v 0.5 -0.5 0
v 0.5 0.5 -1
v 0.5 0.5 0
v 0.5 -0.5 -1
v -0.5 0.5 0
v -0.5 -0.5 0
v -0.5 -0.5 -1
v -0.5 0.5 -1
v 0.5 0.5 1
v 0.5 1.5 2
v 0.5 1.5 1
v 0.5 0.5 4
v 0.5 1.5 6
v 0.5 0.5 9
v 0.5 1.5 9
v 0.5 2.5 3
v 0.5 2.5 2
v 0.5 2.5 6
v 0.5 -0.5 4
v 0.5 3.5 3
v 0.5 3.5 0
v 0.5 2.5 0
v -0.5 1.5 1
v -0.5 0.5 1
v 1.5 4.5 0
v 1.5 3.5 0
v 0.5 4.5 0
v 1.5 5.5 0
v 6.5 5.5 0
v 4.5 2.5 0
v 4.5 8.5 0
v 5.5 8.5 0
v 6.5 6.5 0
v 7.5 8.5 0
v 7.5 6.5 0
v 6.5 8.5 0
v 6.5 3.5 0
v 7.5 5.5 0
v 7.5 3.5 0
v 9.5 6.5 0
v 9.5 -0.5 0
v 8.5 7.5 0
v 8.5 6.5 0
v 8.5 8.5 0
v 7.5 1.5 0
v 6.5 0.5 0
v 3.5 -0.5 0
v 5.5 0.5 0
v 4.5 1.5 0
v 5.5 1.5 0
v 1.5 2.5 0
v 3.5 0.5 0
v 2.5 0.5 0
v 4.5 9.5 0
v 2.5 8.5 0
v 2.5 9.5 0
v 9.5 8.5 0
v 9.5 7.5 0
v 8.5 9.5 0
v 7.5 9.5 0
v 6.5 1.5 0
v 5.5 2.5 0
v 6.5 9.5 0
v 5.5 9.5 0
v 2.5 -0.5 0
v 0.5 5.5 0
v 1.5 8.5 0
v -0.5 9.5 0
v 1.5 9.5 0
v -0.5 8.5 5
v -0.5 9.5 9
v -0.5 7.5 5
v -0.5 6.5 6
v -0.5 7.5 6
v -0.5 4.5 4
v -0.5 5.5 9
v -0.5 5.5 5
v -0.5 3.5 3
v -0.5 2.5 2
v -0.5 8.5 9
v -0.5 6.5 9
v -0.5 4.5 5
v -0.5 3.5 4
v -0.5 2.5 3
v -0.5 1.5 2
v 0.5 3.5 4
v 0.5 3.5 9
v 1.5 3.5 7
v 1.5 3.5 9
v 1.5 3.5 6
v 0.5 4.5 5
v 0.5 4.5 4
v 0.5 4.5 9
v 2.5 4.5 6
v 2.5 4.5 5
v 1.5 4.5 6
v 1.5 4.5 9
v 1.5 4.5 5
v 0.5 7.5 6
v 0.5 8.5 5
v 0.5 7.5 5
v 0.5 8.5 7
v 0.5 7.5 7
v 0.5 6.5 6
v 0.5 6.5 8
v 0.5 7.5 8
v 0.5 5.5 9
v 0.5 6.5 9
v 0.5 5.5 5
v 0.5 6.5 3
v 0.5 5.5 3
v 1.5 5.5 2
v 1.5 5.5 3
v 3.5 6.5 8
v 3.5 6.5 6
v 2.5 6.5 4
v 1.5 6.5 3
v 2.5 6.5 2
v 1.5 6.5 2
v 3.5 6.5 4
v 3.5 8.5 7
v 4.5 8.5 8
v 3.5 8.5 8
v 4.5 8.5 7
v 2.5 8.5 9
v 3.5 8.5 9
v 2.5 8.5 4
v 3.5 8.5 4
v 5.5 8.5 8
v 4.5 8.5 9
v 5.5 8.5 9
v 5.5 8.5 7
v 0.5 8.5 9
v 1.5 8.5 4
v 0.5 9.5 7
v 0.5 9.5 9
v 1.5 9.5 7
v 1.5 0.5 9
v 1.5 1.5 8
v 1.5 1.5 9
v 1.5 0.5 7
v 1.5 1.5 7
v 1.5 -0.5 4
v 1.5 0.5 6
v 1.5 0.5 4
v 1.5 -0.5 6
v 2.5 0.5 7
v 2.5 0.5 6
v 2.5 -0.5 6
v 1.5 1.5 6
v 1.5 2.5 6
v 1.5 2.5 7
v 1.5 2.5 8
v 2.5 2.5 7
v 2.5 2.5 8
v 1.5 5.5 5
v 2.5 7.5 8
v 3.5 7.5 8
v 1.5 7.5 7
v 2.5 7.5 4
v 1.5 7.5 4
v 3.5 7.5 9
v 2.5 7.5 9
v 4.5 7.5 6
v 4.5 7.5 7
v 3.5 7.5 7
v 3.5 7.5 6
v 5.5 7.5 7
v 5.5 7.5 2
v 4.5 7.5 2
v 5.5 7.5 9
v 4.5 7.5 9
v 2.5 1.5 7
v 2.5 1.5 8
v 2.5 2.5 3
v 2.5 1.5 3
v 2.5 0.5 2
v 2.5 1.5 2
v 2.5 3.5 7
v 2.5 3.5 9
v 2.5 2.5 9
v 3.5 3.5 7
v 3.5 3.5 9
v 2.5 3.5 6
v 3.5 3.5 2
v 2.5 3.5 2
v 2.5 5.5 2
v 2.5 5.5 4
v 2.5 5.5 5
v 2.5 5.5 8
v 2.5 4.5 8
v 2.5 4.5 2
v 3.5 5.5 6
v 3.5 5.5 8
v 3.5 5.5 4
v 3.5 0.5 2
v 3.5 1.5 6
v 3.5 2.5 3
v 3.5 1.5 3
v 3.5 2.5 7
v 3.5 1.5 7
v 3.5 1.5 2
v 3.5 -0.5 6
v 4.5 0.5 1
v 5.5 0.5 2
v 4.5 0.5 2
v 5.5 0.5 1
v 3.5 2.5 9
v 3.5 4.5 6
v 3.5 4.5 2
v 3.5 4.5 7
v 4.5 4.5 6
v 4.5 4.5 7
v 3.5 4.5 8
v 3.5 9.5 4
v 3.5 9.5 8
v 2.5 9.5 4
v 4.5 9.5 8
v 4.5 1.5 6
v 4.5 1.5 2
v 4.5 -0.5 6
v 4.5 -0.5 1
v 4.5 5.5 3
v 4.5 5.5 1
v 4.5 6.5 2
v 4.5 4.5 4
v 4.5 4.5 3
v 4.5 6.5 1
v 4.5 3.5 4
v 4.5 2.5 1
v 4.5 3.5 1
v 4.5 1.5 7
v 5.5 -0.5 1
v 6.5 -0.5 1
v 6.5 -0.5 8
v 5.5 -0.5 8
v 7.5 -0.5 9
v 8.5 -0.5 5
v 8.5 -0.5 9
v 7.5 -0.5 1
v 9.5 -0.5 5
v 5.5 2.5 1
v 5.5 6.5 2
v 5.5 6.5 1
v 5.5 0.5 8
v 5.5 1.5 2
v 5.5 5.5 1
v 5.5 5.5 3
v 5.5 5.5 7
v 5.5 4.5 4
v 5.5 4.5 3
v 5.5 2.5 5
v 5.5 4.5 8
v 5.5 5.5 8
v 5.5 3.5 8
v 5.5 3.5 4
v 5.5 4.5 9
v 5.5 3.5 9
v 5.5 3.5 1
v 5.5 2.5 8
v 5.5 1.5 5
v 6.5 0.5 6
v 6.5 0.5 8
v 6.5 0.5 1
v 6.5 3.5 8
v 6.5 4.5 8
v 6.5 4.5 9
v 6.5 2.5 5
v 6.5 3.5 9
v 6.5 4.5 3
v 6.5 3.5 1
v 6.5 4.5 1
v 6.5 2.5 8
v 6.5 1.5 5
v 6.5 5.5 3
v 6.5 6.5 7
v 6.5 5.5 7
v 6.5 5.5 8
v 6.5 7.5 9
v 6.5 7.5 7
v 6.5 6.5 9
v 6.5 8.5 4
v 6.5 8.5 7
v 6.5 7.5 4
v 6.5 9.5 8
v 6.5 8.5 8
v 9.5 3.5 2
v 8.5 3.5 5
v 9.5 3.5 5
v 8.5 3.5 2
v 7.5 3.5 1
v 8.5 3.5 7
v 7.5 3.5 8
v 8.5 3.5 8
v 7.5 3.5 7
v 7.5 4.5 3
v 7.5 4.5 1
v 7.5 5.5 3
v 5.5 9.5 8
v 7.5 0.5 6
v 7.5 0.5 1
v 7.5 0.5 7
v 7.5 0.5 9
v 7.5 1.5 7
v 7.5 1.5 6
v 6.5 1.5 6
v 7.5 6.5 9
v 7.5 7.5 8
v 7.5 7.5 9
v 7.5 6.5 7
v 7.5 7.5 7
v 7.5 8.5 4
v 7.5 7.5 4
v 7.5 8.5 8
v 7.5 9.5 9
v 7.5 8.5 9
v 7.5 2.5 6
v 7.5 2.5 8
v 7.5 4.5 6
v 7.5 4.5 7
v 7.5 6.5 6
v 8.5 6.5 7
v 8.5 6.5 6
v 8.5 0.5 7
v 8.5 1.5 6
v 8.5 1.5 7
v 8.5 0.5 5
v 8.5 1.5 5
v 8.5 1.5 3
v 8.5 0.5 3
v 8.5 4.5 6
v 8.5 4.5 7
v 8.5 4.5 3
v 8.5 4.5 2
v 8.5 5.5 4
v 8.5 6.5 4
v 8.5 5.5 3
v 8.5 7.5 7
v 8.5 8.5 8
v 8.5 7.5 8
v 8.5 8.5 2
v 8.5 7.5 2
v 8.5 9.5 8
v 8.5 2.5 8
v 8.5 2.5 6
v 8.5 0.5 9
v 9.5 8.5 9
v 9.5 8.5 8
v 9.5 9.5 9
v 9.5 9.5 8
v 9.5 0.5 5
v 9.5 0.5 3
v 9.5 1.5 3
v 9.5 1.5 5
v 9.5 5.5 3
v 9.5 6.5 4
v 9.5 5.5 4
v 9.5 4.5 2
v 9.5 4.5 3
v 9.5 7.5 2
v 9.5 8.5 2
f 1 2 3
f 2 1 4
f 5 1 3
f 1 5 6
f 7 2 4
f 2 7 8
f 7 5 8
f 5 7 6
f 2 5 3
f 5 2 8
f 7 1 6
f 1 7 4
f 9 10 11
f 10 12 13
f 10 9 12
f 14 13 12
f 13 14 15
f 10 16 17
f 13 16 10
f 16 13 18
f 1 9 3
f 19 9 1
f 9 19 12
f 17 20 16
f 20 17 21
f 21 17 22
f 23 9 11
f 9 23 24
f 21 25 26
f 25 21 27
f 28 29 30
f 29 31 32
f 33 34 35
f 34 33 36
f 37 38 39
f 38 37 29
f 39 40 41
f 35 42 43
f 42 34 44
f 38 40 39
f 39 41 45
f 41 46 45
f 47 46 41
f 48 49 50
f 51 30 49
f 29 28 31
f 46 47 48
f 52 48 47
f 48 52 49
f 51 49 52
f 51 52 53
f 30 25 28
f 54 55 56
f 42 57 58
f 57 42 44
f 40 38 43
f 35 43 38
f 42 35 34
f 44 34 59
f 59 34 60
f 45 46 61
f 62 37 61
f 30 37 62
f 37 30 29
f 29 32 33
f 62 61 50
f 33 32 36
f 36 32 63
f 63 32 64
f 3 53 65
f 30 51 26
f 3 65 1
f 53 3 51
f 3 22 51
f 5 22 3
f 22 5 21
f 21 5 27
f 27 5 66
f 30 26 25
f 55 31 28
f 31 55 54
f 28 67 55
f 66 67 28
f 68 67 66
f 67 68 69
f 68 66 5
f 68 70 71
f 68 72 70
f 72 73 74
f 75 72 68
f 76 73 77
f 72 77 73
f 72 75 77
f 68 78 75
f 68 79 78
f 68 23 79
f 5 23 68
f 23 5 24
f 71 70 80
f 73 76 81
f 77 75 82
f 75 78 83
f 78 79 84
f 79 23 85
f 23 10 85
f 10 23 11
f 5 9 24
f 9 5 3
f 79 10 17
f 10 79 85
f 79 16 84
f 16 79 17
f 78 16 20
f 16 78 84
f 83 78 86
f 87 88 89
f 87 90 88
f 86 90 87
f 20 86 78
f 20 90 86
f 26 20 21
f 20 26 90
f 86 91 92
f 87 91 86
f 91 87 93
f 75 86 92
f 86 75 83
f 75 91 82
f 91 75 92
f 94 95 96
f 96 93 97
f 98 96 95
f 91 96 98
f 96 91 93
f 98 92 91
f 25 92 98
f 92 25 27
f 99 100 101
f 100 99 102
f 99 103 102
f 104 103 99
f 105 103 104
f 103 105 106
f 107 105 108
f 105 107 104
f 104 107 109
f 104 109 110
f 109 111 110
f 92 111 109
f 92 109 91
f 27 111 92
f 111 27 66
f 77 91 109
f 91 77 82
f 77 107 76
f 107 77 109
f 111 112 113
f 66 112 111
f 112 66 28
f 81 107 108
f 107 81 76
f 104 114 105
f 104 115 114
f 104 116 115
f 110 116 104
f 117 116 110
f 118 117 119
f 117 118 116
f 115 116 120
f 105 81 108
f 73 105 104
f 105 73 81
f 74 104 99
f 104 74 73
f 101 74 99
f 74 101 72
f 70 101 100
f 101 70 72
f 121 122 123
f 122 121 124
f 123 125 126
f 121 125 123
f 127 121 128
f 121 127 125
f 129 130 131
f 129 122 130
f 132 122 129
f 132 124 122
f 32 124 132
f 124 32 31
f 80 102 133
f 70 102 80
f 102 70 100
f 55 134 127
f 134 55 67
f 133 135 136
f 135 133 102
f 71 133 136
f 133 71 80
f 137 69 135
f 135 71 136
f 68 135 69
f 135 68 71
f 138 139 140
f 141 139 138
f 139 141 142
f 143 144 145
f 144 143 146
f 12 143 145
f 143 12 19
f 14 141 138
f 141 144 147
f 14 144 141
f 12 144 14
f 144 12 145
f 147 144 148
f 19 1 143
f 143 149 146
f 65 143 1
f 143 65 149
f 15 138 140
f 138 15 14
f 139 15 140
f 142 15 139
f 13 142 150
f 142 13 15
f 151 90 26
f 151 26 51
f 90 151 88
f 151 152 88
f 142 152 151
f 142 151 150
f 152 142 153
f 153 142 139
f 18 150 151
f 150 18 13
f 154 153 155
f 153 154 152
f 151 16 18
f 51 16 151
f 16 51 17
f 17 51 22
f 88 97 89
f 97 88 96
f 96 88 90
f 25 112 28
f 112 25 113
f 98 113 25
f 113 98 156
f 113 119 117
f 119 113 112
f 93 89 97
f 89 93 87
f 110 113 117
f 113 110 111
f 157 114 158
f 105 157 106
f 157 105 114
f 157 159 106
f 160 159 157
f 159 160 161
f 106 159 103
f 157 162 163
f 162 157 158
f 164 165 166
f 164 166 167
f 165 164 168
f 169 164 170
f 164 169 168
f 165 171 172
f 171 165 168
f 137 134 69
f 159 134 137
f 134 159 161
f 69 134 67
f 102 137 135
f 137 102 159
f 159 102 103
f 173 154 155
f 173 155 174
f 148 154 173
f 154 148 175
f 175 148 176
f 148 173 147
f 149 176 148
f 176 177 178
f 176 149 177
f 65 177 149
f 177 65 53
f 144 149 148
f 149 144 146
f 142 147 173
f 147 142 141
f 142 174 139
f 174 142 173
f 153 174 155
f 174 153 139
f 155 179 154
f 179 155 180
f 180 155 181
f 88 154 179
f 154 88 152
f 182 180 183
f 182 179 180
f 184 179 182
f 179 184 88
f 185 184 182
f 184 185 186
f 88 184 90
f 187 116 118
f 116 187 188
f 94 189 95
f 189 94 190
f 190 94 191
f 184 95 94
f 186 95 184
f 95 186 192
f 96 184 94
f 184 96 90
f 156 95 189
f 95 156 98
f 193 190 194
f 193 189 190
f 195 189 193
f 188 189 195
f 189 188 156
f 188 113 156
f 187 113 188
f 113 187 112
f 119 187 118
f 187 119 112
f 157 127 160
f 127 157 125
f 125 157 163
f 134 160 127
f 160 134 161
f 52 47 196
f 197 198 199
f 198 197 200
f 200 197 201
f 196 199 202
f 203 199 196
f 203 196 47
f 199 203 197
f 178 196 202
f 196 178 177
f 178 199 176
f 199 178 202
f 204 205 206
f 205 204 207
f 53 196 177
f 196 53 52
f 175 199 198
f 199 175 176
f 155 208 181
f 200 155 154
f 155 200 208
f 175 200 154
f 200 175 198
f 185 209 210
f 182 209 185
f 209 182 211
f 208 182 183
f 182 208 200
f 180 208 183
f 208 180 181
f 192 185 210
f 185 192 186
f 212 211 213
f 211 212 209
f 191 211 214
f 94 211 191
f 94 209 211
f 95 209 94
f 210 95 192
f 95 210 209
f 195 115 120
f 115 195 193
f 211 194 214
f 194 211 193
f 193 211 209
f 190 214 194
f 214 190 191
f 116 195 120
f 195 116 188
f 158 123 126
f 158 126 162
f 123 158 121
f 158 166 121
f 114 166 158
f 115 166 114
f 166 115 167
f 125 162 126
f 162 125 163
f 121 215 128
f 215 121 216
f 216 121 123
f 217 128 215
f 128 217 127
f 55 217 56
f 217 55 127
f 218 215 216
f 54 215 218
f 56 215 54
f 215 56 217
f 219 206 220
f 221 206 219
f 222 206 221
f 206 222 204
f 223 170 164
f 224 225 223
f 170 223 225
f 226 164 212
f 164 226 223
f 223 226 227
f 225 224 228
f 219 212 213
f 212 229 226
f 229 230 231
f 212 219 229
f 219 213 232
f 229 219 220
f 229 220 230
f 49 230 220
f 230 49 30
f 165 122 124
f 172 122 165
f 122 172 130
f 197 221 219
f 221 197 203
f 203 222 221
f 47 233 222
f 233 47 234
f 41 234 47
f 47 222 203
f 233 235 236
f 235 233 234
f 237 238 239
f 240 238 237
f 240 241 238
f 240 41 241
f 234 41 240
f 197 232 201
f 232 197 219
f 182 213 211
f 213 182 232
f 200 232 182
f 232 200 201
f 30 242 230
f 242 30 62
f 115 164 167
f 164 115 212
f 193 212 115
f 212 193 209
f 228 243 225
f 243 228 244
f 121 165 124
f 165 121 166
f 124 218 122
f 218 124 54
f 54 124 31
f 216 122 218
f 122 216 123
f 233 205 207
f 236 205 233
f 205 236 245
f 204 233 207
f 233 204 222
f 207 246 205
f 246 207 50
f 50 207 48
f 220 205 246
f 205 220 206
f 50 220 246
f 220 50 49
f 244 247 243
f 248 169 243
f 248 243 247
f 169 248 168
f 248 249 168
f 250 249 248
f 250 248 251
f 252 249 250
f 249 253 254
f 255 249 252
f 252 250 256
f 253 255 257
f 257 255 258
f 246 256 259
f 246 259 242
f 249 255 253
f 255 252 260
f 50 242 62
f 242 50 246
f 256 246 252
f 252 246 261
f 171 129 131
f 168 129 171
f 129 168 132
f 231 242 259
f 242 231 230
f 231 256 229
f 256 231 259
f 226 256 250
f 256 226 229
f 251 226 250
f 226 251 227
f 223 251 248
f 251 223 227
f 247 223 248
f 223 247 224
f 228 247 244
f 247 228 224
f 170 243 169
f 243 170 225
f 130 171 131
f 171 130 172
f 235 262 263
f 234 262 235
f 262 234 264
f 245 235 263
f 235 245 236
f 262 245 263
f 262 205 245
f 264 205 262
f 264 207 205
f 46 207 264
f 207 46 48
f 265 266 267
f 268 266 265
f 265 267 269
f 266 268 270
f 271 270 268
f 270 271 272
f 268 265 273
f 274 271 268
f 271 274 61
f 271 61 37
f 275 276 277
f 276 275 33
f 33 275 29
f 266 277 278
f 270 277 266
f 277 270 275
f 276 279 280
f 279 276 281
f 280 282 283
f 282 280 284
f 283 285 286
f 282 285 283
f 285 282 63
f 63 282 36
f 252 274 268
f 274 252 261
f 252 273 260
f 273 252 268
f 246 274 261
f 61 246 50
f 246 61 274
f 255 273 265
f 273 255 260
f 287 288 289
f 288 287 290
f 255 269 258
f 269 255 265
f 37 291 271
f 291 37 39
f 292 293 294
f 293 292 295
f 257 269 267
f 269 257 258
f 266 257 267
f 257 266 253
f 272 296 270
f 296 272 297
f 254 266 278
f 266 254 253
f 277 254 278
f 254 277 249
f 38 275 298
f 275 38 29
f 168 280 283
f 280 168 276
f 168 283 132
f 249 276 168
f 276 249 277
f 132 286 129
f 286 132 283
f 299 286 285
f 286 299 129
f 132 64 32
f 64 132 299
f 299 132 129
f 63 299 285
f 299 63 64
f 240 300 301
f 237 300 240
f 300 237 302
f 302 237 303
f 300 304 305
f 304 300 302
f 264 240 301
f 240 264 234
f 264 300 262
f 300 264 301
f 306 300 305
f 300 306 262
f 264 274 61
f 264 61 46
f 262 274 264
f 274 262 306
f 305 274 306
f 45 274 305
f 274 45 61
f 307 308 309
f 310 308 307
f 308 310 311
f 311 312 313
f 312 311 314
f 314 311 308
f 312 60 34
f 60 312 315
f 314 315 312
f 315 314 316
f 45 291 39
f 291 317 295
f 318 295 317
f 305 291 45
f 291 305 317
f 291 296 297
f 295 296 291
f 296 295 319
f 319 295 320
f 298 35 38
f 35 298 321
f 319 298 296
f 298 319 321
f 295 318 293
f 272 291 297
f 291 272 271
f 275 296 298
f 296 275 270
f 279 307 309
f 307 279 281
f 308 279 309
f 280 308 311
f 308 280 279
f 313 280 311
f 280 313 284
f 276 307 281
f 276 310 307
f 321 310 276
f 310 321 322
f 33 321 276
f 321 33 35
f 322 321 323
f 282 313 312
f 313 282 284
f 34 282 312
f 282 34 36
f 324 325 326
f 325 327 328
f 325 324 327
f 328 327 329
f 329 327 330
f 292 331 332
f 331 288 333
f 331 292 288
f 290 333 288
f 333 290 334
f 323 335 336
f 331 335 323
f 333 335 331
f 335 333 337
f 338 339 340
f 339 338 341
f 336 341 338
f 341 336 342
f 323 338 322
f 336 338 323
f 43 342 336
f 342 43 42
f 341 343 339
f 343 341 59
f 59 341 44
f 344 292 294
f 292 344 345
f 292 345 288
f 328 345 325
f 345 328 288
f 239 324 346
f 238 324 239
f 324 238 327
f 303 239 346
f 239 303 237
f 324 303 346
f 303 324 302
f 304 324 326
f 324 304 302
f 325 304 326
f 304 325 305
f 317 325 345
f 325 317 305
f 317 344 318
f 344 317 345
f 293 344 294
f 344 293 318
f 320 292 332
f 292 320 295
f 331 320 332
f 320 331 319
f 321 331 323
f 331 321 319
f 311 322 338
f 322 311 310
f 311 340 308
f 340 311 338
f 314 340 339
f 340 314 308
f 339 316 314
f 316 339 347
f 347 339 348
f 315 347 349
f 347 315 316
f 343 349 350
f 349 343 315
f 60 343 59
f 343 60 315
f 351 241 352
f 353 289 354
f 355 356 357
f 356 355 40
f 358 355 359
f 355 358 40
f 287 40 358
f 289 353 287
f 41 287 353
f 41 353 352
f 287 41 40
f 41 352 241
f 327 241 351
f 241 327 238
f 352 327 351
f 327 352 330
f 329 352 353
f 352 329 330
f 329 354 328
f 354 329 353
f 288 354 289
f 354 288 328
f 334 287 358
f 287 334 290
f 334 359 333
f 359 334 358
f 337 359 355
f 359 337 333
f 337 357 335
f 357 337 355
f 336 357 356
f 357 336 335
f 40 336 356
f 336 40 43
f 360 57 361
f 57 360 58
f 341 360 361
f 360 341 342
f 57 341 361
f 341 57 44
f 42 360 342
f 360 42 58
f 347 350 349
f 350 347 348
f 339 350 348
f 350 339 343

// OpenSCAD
union() {
    translate([0, 0, -0.5]) color([1, 0, 0]) cube([1, 1, 1], center=true);
    translate([0, 1, 0.5]) cube([1, 1, 1], center=true);
    translate([0, 2, 1.0]) cube([1, 1, 2], center=true);
    translate([0, 3, 1.5]) cube([1, 1, 3], center=true);
    translate([0, 4, 2.0]) cube([1, 1, 4], center=true);
    translate([0, 5, 2.5]) cube([1, 1, 5], center=true);
    translate([0, 6, 4.5]) cube([1, 1, 9], center=true);
    translate([0, 7, 3.0]) cube([1, 1, 6], center=true);
    translate([0, 8, 2.5]) cube([1, 1, 5], center=true);
    translate([0, 9, 4.5]) cube([1, 1, 9], center=true);
    translate([1, 0, 2.0]) cube([1, 1, 4], center=true);
    translate([1, 1, 4.5]) cube([1, 1, 9], center=true);
    translate([1, 2, 3.0]) cube([1, 1, 6], center=true);
    translate([1, 4, 4.5]) cube([1, 1, 9], center=true);
    translate([1, 6, 1.5]) cube([1, 1, 3], center=true);
    translate([1, 7, 4.0]) cube([1, 1, 8], center=true);
    translate([1, 8, 3.5]) cube([1, 1, 7], center=true);
    translate([1, 9, 3.5]) cube([1, 1, 7], center=true);
    translate([2, 0, 3.0]) cube([1, 1, 6], center=true);
    translate([2, 1, 3.5]) cube([1, 1, 7], center=true);
    translate([2, 2, 4.0]) cube([1, 1, 8], center=true);
    translate([2, 3, 3.5]) cube([1, 1, 7], center=true);
    translate([2, 4, 3.0]) cube([1, 1, 6], center=true);
    translate([2, 5, 2.5]) cube([1, 1, 5], center=true);
    translate([2, 6, 1.0]) cube([1, 1, 2], center=true);
    translate([2, 7, 4.0]) cube([1, 1, 8], center=true);
    translate([2, 8, 2.0]) cube([1, 1, 4], center=true);
    translate([3, 1, 1.0]) cube([1, 1, 2], center=true);
    translate([3, 2, 1.5]) cube([1, 1, 3], center=true);
    translate([3, 3, 4.5]) cube([1, 1, 9], center=true);
    translate([3, 4, 1.0]) cube([1, 1, 2], center=true);
    translate([3, 5, 4.0]) cube([1, 1, 8], center=true);
    translate([3, 6, 2.0]) cube([1, 1, 4], center=true);
    translate([3, 7, 4.0]) cube([1, 1, 8], center=true);
    translate([3, 8, 4.5]) cube([1, 1, 9], center=true);
    translate([3, 9, 2.0]) cube([1, 1, 4], center=true);
    translate([4, 0, 3.0]) cube([1, 1, 6], center=true);
    translate([4, 1, 3.0]) cube([1, 1, 6], center=true);
    translate([4, 2, 3.5]) cube([1, 1, 7], center=true);
    translate([4, 3, 3.5]) cube([1, 1, 7], center=true);
    translate([4, 4, 3.5]) cube([1, 1, 7], center=true);
    translate([4, 5, 3.0]) cube([1, 1, 6], center=true);
    translate([4, 6, 3.0]) cube([1, 1, 6], center=true);
    translate([4, 7, 3.0]) cube([1, 1, 6], center=true);
    translate([4, 8, 3.5]) cube([1, 1, 7], center=true);
    translate([4, 9, 4.0]) cube([1, 1, 8], center=true);
    translate([5, 0, 0.5]) cube([1, 1, 1], center=true);
    translate([5, 1, 1.0]) cube([1, 1, 2], center=true);
    translate([5, 3, 0.5]) cube([1, 1, 1], center=true);
    translate([5, 4, 2.0]) cube([1, 1, 4], center=true);
    translate([5, 5, 1.5]) cube([1, 1, 3], center=true);
    translate([5, 6, 0.5]) cube([1, 1, 1], center=true);
    translate([5, 7, 1.0]) cube([1, 1, 2], center=true);
    translate([5, 8, 4.5]) cube([1, 1, 9], center=true);
    translate([6, 0, 4.0]) cube([1, 1, 8], center=true);
    translate([6, 2, 2.5]) cube([1, 1, 5], center=true);
    translate([6, 3, 4.0]) cube([1, 1, 8], center=true);
    translate([6, 4, 4.5]) cube([1, 1, 9], center=true);
    translate([6, 5, 4.0]) cube([1, 1, 8], center=true);
    translate([6, 6, 3.5]) cube([1, 1, 7], center=true);
    translate([6, 7, 3.5]) cube([1, 1, 7], center=true);
    translate([6, 8, 3.5]) cube([1, 1, 7], center=true);
    translate([6, 9, 4.0]) cube([1, 1, 8], center=true);
    translate([7, 0, 0.5]) cube([1, 1, 1], center=true);
    translate([7, 1, 3.0]) cube([1, 1, 6], center=true);
    translate([7, 4, 0.5]) cube([1, 1, 1], center=true);
    translate([7, 5, 1.5]) cube([1, 1, 3], center=true);
    translate([7, 7, 4.5]) cube([1, 1, 9], center=true);
    translate([7, 8, 2.0]) cube([1, 1, 4], center=true);
    translate([8, 0, 4.5]) cube([1, 1, 9], center=true);
    translate([8, 1, 3.5]) cube([1, 1, 7], center=true);
    translate([8, 2, 3.0]) cube([1, 1, 6], center=true);
    translate([8, 3, 4.0]) cube([1, 1, 8], center=true);
    translate([8, 4, 3.5]) cube([1, 1, 7], center=true);
    translate([8, 5, 3.0]) cube([1, 1, 6], center=true);
    translate([8, 6, 3.0]) cube([1, 1, 6], center=true);
    translate([8, 7, 3.5]) cube([1, 1, 7], center=true);
    translate([8, 8, 4.0]) cube([1, 1, 8], center=true);
    translate([8, 9, 4.5]) cube([1, 1, 9], center=true);
    translate([9, 0, 2.5]) cube([1, 1, 5], center=true);
    translate([9, 1, 1.5]) cube([1, 1, 3], center=true);
    translate([9, 2, 2.5]) cube([1, 1, 5], center=true);
    translate([9, 3, 2.5]) cube([1, 1, 5], center=true);
    translate([9, 4, 1.0]) cube([1, 1, 2], center=true);
    translate([9, 5, 1.5]) cube([1, 1, 3], center=true);
    translate([9, 6, 2.0]) cube([1, 1, 4], center=true);
    translate([9, 8, 1.0]) cube([1, 1, 2], center=true);
    translate([9, 9, 8.5]) color([0, 0, 1]) cube([1, 1, 1], center=true);
}
